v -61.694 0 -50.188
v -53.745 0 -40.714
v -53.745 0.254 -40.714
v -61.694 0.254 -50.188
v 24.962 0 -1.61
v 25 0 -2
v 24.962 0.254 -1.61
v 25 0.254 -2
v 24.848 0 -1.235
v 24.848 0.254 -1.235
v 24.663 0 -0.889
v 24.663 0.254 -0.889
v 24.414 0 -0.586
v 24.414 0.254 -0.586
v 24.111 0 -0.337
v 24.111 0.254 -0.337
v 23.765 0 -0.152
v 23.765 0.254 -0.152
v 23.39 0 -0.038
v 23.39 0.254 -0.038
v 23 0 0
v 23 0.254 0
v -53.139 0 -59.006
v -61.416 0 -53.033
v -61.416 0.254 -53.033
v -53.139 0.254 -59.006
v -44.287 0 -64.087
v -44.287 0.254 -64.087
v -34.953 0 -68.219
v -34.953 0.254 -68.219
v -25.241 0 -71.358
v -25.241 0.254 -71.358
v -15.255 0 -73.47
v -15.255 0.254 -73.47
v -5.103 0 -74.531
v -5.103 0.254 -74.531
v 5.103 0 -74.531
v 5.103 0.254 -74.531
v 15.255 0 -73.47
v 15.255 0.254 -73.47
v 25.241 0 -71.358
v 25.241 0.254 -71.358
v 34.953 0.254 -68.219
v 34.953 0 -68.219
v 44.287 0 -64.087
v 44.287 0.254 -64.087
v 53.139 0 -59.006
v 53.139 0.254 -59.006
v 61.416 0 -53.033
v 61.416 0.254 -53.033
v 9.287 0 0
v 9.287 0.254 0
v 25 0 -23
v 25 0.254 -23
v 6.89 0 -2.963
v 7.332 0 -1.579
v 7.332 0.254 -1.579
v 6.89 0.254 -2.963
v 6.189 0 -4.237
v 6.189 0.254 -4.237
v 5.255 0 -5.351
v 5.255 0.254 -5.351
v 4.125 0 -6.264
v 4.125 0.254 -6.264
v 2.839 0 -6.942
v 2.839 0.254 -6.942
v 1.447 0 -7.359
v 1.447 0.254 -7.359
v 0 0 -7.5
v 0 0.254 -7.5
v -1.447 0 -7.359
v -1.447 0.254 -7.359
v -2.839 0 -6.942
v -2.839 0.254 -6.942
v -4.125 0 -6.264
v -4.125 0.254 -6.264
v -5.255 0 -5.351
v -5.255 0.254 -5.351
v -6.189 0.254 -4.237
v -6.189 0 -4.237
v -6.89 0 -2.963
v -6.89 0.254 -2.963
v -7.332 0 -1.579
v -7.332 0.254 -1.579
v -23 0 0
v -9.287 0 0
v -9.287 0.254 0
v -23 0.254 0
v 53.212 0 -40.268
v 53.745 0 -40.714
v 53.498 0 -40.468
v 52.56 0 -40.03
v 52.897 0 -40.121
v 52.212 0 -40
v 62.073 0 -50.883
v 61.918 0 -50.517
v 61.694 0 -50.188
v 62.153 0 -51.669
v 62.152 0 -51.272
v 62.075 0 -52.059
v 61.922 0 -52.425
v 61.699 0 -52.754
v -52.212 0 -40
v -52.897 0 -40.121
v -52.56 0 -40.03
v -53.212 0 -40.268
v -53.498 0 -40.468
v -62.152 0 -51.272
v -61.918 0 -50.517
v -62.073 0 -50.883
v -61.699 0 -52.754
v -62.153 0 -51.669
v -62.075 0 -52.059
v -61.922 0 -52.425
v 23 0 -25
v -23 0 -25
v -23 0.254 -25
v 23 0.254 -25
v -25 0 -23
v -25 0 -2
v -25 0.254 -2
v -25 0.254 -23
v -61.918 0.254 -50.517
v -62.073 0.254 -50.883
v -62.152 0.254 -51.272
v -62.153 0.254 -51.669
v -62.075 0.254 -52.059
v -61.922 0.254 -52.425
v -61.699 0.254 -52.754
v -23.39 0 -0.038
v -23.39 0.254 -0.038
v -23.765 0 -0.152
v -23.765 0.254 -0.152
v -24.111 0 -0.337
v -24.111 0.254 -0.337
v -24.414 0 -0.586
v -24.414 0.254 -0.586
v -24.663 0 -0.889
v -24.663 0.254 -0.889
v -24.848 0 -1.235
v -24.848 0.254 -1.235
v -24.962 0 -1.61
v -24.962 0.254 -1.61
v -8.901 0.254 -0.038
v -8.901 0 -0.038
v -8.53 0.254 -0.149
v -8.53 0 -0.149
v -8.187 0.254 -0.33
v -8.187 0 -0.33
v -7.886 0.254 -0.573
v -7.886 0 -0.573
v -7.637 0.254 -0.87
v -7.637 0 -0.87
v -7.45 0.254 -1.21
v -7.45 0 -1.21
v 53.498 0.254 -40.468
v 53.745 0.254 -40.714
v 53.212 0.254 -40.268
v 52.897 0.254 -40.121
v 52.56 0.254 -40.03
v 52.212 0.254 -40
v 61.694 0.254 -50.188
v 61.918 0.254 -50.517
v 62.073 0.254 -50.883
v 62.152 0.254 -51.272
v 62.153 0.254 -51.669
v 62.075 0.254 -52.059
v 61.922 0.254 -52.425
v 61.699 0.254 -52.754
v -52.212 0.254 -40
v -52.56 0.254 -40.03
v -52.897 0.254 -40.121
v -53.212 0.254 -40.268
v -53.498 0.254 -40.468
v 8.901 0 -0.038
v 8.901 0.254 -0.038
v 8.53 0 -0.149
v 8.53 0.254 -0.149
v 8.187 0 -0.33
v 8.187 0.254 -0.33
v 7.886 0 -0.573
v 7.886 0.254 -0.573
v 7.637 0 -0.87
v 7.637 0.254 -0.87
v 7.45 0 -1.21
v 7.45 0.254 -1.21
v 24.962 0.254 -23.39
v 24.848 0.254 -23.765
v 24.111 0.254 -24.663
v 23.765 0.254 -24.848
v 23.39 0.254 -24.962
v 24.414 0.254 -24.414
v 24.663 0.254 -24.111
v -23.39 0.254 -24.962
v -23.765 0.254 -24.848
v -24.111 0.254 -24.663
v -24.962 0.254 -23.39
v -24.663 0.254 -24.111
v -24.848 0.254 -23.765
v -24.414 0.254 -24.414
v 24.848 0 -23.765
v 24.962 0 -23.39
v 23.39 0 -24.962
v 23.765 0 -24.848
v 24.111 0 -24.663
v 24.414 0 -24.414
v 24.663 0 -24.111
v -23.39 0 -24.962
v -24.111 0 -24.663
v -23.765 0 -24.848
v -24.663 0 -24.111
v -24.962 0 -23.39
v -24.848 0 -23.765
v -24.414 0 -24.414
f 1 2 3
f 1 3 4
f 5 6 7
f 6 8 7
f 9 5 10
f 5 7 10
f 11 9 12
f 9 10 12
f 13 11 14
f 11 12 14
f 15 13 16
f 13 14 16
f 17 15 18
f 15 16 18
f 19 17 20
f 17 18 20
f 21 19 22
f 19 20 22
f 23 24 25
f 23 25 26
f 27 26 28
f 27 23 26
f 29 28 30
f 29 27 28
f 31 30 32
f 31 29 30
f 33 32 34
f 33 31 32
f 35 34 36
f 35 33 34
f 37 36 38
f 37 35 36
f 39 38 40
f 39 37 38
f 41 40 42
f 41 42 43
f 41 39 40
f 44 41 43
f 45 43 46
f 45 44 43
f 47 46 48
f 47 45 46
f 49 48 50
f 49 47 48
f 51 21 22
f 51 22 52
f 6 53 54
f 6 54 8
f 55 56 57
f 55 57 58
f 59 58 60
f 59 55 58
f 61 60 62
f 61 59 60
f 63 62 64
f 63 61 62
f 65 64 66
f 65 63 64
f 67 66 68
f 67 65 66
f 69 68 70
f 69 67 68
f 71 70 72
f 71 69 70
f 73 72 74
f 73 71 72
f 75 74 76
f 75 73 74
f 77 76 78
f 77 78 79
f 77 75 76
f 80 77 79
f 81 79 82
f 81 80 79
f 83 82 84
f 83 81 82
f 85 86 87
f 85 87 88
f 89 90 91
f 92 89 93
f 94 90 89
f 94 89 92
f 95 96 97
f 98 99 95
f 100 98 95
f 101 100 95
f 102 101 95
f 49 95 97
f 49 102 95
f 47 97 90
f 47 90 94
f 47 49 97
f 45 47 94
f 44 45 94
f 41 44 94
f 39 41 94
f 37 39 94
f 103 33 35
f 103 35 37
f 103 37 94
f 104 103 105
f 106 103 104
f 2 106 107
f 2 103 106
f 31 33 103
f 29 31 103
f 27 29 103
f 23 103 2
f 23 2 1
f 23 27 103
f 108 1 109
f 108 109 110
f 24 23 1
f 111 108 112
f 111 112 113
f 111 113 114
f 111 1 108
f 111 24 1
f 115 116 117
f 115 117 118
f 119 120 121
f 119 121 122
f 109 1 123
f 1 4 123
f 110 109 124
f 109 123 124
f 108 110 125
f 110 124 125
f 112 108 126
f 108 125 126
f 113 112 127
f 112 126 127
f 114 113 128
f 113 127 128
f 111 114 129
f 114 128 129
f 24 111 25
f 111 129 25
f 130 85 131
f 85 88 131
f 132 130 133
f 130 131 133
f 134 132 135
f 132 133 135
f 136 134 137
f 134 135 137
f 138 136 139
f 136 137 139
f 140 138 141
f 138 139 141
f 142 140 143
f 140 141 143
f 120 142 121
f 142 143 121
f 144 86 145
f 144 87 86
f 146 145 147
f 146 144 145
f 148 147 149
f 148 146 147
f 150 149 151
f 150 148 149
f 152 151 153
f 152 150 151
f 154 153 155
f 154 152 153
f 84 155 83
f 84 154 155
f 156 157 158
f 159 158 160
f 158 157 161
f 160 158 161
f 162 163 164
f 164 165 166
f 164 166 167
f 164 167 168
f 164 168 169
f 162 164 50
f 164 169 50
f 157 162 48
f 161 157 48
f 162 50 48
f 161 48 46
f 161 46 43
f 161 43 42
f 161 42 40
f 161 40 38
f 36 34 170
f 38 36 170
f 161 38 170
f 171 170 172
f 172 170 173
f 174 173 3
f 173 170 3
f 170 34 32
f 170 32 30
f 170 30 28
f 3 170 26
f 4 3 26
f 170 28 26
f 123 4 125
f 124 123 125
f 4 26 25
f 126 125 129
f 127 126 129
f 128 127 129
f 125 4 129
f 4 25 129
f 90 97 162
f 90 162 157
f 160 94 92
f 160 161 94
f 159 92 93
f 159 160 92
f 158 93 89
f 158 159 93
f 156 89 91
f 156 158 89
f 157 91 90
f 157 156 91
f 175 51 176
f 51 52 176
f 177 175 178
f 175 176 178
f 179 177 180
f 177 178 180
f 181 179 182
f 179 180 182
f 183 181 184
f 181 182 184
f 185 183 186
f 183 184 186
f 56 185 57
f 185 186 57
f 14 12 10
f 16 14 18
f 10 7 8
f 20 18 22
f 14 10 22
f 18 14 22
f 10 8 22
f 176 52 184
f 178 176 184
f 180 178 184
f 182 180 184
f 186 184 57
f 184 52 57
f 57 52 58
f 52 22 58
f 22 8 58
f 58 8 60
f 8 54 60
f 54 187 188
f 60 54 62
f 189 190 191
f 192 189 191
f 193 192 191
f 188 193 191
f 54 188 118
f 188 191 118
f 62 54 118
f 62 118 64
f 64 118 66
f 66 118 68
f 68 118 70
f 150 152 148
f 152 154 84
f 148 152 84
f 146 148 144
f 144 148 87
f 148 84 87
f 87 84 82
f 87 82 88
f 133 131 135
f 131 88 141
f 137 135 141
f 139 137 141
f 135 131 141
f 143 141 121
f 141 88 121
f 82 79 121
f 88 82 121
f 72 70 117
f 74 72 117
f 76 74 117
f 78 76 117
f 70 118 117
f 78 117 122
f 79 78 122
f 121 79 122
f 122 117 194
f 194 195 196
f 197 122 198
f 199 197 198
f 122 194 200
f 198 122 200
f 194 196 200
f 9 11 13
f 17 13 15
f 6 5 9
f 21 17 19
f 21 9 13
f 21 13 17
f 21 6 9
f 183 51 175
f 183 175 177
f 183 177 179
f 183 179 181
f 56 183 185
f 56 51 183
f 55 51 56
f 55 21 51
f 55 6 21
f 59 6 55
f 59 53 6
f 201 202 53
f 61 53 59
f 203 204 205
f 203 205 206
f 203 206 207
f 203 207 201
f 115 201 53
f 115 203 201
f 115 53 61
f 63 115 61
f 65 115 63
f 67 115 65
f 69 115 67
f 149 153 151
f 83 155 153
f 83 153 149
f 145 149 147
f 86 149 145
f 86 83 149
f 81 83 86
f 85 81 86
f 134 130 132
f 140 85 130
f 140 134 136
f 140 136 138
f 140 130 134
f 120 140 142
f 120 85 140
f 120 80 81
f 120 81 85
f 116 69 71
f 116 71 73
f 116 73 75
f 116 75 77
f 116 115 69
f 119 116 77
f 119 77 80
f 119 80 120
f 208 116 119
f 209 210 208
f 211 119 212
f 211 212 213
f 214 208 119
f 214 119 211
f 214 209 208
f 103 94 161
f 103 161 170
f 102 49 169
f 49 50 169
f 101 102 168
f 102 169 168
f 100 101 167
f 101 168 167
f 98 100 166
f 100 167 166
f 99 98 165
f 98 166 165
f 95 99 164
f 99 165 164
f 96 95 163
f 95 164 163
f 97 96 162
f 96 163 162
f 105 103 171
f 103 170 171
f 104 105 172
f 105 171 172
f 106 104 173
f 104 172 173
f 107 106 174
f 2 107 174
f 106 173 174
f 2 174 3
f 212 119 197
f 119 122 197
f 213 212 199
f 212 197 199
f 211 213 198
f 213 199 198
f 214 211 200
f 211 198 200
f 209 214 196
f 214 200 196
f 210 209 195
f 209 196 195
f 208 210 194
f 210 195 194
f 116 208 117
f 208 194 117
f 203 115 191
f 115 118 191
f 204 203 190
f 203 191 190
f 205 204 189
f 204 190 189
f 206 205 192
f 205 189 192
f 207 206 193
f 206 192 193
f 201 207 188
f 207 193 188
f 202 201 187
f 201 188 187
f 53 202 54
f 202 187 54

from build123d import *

# Parameters (mm, degrees)
BOSS_EXTRUDE1_DEPTH   = 0.254
BOSS_EXTRUDE1_2_DEPTH = 0.254
FILLET1_R             = 2
FILLET2_R             = 2


with BuildPart() as part:
    # Sketch1 → Boss-Extrude1 (new body)
    with BuildSketch(Plane(origin=(0, 0, 0), x_dir=(1, 0, 0), z_dir=(0, 1, 0))):
        with BuildLine():
            Line((-7.5, 0), (-25, 0))
            Line((-25, 0), (-25, 25))
            Line((-25, 25), (25, 25))
            Line((25, 25), (25, 0))
            Line((25, 0), (7.5, 0))
            ThreePointArc((7.5, 0), (0, 7.5), (-7.5, 0))
        make_face()
    extrude(amount=BOSS_EXTRUDE1_DEPTH)

    # Fillet2
    fillet2_edges = [part.edges().sort_by_distance(p)[0] for p in [
        (-7.5, 0.127, 0),
        (-25, 0.127, 0),
        (-25, 0.127, -25),
        (25, 0.127, -25),
        (25, 0.127, 0),
        (7.5, 0.127, 0),
    ]]
    fillet(fillet2_edges, radius=FILLET2_R)


with BuildPart() as body_2:
    # Sketch1 → Boss-Extrude1 2 (new body)
    with BuildSketch(Plane(origin=(0, 0, 0), x_dir=(1, 0, 0), z_dir=(0, 1, 0))):
        with BuildLine():
            Line((53.145094587, 40), (-53.145094587, 40))
            Line((-53.145094587, 40), (-62.993185749, 51.736498023))
            ThreePointArc((-62.993185749, 51.736498023), (0, 74.664142597), (62.993185749, 51.736498023))
            Line((62.993185749, 51.736498023), (53.145094587, 40))
        make_face()
    extrude(amount=BOSS_EXTRUDE1_2_DEPTH)

    # Fillet1
    fillet1_edges = [body_2.edges().sort_by_distance(p)[0] for p in [
        (53.145094587, 0.127, -40),
        (-53.145094587, 0.127, -40),
        (-62.993185749, 0.127, -51.736498023),
        (62.993185749, 0.127, -51.736498023),
    ]]
    fillet(fillet1_edges, radius=FILLET1_R)


solid = Compound([part.part, body_2.part])
